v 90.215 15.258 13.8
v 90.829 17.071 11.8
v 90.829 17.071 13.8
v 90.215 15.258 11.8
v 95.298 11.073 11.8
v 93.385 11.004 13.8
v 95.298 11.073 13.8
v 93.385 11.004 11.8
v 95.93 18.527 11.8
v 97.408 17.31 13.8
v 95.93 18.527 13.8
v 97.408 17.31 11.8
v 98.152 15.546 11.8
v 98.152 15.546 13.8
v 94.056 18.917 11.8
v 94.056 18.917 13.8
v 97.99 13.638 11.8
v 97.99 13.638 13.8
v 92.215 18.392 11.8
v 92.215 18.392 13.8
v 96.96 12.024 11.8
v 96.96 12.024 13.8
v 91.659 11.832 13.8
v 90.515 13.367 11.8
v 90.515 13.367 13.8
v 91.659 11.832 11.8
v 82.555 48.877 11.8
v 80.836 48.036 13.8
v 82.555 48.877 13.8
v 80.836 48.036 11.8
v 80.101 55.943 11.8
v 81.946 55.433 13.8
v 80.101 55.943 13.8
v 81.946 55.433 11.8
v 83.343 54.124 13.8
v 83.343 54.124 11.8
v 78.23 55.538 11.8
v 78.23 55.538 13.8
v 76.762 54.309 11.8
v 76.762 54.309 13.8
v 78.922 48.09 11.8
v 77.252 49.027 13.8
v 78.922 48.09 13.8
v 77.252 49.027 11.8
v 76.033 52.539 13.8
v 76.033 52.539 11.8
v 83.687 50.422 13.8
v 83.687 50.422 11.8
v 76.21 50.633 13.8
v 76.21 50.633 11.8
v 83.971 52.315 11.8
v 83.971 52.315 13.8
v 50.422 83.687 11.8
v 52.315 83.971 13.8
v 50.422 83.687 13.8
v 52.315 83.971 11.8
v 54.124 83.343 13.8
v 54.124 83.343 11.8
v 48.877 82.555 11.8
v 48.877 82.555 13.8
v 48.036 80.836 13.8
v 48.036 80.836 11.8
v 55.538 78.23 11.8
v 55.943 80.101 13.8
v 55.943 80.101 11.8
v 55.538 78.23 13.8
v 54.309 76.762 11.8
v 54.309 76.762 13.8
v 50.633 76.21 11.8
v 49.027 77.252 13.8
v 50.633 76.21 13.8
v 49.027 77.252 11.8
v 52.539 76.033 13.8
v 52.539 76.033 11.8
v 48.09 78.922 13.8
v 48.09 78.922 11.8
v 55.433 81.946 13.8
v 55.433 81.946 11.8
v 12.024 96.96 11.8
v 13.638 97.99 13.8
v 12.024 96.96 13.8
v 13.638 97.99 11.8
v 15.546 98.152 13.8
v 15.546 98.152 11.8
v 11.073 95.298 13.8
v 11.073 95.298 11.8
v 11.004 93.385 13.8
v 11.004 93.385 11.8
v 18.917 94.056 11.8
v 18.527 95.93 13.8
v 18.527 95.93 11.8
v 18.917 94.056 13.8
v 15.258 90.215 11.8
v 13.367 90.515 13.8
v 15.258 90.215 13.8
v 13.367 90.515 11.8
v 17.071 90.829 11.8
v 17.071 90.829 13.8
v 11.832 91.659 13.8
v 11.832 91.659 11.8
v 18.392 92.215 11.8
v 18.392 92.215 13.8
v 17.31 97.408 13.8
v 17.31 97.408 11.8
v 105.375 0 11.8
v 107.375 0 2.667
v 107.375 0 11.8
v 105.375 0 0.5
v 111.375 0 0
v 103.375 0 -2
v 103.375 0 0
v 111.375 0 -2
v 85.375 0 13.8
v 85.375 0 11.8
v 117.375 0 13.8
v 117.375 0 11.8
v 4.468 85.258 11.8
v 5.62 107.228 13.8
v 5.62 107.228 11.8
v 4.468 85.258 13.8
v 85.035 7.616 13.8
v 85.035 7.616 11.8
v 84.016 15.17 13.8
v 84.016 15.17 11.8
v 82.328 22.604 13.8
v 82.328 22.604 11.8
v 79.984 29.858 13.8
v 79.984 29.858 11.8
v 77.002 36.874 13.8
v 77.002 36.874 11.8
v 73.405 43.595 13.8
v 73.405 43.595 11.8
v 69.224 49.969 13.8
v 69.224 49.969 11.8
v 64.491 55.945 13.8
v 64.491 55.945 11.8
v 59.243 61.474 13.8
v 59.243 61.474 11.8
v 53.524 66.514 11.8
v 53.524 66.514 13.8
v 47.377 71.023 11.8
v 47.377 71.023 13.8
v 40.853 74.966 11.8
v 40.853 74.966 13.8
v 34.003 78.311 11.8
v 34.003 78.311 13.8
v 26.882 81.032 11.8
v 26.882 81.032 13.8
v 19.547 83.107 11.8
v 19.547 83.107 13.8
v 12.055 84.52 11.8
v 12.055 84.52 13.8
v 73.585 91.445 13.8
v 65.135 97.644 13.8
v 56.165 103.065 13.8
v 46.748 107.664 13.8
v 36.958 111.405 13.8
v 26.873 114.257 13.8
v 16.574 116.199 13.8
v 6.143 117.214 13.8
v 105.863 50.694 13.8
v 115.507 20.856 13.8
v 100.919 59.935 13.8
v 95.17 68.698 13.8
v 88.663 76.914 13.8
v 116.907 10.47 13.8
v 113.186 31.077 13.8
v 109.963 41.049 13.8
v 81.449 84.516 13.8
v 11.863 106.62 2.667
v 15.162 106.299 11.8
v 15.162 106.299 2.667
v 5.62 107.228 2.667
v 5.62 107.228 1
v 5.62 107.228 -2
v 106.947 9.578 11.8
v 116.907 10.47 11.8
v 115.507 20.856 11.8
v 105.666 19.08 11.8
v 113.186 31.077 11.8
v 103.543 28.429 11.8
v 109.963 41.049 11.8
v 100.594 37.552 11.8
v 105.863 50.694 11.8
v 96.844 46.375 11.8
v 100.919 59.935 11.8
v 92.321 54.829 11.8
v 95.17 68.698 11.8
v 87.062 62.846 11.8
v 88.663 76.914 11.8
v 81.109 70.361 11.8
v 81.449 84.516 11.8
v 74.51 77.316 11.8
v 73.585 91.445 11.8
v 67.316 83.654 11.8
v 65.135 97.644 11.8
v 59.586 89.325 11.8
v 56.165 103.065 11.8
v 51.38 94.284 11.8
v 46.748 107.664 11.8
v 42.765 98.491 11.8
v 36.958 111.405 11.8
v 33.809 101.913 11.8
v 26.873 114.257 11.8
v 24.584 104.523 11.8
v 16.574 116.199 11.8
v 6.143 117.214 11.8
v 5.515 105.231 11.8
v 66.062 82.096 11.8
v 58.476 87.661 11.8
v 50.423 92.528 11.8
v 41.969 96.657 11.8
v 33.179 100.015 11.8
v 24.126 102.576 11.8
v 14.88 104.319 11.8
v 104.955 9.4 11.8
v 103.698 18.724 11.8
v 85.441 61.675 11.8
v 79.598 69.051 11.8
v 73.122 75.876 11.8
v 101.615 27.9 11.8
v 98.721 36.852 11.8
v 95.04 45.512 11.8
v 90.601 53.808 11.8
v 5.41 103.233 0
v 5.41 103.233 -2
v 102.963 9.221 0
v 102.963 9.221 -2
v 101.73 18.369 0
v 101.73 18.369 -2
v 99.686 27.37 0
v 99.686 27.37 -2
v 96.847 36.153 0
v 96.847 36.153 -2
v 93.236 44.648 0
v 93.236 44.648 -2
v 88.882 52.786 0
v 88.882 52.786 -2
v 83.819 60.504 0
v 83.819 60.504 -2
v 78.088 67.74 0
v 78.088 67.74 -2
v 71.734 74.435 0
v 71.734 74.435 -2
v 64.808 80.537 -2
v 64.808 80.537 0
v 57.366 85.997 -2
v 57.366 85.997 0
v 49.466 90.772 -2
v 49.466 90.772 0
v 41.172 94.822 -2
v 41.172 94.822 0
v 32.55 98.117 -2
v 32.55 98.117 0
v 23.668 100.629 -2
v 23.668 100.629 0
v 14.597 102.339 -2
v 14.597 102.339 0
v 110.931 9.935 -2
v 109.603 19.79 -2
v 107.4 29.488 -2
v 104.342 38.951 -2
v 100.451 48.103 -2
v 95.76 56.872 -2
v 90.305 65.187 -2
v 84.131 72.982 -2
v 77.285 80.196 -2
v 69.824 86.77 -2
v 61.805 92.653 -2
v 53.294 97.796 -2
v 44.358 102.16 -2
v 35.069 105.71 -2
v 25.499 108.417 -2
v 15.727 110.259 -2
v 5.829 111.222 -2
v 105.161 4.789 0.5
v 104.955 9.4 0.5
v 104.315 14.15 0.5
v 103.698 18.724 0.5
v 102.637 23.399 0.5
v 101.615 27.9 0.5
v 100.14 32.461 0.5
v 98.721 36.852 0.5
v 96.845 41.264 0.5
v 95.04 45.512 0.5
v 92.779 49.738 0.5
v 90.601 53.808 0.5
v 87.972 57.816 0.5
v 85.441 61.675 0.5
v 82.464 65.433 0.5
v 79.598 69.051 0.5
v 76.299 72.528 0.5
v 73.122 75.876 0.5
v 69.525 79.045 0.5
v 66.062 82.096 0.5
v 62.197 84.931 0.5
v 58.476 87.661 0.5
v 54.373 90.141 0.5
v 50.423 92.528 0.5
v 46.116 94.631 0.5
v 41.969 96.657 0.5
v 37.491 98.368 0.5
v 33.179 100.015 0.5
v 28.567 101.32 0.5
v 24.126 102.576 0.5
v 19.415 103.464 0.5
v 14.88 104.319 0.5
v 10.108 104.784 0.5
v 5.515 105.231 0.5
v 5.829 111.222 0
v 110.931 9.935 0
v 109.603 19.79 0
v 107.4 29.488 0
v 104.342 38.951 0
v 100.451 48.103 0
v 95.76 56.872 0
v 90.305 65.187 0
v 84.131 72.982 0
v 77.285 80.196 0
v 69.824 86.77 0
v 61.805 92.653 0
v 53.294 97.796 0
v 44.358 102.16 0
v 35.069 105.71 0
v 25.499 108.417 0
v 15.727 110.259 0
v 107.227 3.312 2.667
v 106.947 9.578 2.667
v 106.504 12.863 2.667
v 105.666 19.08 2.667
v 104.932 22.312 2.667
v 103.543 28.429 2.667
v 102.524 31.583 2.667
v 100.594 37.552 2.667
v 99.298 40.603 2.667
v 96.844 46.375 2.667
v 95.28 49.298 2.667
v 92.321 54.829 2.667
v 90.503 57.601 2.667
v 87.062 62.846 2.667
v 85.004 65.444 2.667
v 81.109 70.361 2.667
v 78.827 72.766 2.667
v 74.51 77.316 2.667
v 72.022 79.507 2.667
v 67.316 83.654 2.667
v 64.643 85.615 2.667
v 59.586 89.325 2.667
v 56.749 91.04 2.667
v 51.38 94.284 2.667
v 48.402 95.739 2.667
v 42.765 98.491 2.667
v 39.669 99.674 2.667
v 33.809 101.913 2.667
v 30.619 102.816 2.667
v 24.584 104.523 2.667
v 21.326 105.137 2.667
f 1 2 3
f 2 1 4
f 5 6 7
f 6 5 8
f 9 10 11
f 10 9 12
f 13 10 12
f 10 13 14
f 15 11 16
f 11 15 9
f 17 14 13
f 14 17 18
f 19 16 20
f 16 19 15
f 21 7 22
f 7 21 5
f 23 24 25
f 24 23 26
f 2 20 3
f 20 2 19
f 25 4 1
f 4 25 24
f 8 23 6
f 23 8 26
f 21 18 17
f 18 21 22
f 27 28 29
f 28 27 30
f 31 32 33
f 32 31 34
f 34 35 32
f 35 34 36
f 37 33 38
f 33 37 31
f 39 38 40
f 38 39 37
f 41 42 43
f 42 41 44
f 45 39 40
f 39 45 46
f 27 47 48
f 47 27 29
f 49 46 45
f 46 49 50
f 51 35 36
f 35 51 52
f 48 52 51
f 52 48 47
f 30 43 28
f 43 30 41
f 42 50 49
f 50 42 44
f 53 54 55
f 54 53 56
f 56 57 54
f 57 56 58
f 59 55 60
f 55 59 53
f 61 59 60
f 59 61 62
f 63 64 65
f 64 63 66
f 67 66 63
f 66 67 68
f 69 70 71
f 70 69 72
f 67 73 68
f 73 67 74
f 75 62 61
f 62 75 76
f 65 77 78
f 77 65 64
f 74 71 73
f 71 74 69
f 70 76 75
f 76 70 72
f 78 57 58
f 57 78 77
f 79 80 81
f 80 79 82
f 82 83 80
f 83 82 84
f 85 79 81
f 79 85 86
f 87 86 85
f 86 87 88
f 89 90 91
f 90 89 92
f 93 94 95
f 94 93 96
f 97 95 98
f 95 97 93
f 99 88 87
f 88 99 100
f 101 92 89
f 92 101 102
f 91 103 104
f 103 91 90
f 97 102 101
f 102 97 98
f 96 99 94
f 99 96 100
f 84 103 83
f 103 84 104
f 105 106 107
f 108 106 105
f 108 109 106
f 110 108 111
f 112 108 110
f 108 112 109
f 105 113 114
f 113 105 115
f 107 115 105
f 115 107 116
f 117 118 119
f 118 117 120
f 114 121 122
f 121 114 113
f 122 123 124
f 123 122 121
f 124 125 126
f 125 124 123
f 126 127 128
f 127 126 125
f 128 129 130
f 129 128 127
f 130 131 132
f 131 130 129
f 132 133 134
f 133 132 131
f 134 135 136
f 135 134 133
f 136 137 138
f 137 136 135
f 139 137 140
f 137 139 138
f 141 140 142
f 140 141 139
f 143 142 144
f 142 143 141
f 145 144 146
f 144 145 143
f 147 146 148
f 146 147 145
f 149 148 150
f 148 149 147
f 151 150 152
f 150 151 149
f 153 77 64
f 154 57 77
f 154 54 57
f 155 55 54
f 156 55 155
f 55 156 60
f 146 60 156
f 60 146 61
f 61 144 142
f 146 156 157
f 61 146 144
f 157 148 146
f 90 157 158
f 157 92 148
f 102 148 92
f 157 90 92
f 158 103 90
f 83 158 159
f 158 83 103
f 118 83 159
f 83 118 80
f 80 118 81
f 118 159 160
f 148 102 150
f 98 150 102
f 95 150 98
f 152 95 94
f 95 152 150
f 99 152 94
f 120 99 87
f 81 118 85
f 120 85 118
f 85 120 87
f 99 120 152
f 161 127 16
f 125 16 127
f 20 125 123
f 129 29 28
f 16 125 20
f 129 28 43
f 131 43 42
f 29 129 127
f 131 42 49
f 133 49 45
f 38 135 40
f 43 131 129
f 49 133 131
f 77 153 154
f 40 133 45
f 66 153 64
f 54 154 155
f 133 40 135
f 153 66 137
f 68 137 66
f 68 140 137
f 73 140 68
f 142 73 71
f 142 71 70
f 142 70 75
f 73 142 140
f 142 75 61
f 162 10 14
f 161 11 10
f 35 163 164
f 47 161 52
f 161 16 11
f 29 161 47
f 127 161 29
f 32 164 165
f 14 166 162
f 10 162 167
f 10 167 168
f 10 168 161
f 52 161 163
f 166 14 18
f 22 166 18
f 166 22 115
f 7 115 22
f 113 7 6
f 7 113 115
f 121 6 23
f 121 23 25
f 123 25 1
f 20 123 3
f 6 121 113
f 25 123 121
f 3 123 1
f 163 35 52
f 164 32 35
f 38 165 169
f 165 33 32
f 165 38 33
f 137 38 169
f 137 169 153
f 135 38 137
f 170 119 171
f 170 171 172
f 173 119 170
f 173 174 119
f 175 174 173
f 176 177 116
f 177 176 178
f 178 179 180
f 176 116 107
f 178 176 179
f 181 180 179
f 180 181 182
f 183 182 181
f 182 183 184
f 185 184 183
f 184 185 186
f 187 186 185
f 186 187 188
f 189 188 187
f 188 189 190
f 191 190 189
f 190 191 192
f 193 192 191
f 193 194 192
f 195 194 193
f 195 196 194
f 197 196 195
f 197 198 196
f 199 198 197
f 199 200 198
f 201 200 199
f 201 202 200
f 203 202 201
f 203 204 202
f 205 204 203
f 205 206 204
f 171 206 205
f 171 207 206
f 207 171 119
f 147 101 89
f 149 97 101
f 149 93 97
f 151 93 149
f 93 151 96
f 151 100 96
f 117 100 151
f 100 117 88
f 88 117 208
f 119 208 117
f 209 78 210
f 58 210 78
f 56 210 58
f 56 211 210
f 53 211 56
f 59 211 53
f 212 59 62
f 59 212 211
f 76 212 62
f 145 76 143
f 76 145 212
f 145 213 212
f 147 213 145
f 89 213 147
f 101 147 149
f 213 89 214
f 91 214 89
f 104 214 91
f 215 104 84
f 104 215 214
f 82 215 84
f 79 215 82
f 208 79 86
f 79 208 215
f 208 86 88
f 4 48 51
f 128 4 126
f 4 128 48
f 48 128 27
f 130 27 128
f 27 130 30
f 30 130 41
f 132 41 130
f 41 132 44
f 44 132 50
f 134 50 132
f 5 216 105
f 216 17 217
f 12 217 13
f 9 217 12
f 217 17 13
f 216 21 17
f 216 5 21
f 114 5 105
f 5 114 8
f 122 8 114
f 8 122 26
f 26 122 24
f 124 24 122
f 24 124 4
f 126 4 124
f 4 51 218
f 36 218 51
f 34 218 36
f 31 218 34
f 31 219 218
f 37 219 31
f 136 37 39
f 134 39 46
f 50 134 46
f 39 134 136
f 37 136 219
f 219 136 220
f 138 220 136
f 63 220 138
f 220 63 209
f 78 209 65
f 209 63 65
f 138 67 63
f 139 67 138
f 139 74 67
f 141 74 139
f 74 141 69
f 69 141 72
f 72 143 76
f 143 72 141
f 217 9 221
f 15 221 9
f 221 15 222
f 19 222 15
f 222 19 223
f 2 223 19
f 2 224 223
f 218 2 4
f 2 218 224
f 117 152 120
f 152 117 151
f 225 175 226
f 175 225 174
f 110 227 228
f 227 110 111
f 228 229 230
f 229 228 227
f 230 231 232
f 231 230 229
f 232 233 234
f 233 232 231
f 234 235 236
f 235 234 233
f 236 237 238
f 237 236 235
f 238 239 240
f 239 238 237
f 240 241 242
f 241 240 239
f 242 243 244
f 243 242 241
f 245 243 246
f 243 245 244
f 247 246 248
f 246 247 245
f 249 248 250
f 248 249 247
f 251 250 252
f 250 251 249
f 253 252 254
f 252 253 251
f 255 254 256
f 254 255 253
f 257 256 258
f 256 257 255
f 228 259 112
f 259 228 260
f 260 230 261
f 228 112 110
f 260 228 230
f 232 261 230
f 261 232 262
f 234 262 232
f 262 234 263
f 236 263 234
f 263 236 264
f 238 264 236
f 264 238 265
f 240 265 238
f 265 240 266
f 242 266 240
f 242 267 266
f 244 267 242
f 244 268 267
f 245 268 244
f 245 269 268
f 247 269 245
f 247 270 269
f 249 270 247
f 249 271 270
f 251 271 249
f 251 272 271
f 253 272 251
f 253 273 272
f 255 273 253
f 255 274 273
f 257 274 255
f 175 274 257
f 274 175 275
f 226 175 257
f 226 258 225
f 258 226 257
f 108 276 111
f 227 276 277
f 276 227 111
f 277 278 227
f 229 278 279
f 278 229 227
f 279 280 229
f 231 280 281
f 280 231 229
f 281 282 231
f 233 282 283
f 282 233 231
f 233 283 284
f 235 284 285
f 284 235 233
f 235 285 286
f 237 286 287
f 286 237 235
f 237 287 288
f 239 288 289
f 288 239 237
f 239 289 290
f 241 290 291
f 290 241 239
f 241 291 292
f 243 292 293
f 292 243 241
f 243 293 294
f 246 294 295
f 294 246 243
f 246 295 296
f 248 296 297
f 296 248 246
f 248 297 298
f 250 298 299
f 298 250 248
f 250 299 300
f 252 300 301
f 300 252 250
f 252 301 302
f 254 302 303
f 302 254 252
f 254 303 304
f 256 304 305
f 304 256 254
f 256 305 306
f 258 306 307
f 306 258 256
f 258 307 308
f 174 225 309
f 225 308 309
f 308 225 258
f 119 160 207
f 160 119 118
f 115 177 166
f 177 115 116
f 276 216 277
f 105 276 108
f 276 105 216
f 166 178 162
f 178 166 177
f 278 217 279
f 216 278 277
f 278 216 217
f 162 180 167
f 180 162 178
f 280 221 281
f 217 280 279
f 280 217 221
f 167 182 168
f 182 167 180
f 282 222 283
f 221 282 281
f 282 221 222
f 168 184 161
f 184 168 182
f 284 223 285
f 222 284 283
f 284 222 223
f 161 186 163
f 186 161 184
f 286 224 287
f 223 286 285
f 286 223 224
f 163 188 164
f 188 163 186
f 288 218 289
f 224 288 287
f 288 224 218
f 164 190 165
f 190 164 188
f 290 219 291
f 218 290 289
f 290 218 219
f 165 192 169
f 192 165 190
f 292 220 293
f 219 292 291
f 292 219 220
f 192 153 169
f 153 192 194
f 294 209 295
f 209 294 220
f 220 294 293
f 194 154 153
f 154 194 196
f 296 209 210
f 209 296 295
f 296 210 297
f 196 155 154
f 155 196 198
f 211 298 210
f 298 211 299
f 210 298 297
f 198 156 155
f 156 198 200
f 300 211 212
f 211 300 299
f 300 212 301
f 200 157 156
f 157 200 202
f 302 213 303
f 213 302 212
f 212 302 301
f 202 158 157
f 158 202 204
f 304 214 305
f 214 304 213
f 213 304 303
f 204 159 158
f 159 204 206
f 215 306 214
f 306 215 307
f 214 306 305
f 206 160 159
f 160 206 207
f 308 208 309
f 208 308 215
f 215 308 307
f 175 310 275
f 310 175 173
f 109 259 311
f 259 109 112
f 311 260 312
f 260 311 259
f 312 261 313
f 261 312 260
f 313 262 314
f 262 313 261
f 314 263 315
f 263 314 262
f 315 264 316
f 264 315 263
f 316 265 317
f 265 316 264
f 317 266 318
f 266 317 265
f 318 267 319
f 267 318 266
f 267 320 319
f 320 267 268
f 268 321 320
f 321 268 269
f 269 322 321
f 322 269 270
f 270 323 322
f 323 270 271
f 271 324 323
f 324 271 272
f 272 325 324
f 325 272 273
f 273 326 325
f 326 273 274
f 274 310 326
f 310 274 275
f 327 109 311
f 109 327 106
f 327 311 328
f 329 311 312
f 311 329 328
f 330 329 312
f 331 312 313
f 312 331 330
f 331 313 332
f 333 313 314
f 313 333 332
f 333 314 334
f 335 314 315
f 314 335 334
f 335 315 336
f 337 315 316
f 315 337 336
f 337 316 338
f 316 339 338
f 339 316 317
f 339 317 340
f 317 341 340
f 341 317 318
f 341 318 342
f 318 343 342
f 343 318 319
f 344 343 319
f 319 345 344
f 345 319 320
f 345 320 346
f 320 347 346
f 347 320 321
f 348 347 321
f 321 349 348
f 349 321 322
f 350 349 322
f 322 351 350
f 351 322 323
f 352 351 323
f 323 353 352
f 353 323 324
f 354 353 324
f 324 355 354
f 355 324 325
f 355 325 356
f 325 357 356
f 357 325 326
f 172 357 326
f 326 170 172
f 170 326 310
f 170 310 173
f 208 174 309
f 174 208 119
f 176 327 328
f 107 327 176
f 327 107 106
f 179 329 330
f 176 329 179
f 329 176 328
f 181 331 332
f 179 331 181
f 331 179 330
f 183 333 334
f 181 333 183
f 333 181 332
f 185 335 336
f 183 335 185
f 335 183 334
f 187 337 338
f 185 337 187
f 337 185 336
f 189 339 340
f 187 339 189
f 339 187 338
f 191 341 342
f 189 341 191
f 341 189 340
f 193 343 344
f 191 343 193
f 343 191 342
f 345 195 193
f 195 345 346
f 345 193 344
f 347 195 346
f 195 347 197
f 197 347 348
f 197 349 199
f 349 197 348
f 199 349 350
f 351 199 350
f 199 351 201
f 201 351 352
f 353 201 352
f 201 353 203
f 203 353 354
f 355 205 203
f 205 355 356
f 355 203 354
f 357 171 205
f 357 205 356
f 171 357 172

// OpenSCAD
ANTENA_DIAMETER = 210.75;
ANTENNA_RIM_THICKNESS = 11.8;

CLAMP_RIDGE_THICKNESS = 2;
CLAMP_RIDGE_DIAMETER = ANTENA_DIAMETER;
CLAMP_RAIL_INNER_TOP = 20;
CLAMP_RAIL_INNER_BOTTOM = 2;
CLAMP_RAIL_OUTER_TOP = 10;
CLAMP_RAIL_THICKNESS = 2;
CLAMP_RAIL_OUTER_BOTTOM = 4;
CLAMP_RAIL_OUTER_BOTTOM_SUPPORT_HEIGHT = 4;

module cylinder_slice(radius, height, thickness, angle)
{
    rotate_extrude(angle=angle)
        translate([radius, 0]) 
            square([thickness, height]); 
}

module cylinder_ramp_slice(radius, height, thickness, angle, reverse=false)
{
    rotate_extrude(angle = angle)
        polygon(
            reverse ?
            // reversed slope: inner = height, outer = 0
            [
                [radius,            0],       // inner low
                [radius+thickness,  height],  // outer high
                [radius+thickness,  0]        // outer low
            ]
            :
            // normal slope: inner = 0, outer = height
            [
                [radius,            0],
                [radius,            height],
                [radius+thickness,  0]
            ]
        );
}


module radial_cylinders(
    count,          // number of cylinders
    circle_r,       // radius of the circle on which cylinders sit
    cyl_r,          // cylinder radius
    cyl_h,          // cylinder height
    phase = 0       // rotation offset in degrees
){
    for(i = [0 : count-1]) {
        angle = phase + 360/count * i;

        // Position cylinder on circle
        translate([circle_r*cos(angle), circle_r*sin(angle), 0])
            // Rotate cylinder so its axis is perpendicular to the circle plane
            rotate([0, 0, angle])
                cylinder(h = cyl_h, r = cyl_r, center = true);
    }
}



//cylinder(ANTENNA_RIM_THICKNESS, ANTENA_DIAMETER/2, ANTENA_DIAMETER/2, $fa=5);

// rotate_extrude(angle = 60, $fa=5)   // slice angle in degrees
//     translate([CLAMP_RIDGE_DIAMETER/2, 0])       // radius = 10
//         square([CLAMP_RIDGE_THICKNESS, ANTENNA_RIM_THICKNESS]);      // thickness = 2
union()
{
    cylinder_slice(CLAMP_RIDGE_DIAMETER/2, ANTENNA_RIM_THICKNESS, CLAMP_RIDGE_THICKNESS, 87, $fa=5);

    color("red")
    union()
    {
        difference()
        {
            translate([0,0,ANTENNA_RIM_THICKNESS])
            cylinder_slice(CLAMP_RIDGE_DIAMETER/2-CLAMP_RAIL_INNER_TOP, CLAMP_RAIL_THICKNESS, CLAMP_RAIL_INNER_TOP+CLAMP_RIDGE_THICKNESS, 87, $fa=5);

            translate([0,0,7+ANTENNA_RIM_THICKNESS/2])
            radial_cylinders(15, CLAMP_RIDGE_DIAMETER/2-CLAMP_RAIL_INNER_TOP/2, 4, 15, 9);
        }


        translate([0,0,-CLAMP_RAIL_THICKNESS])
        cylinder_slice(CLAMP_RIDGE_DIAMETER/2-CLAMP_RAIL_INNER_BOTTOM, CLAMP_RAIL_THICKNESS, CLAMP_RAIL_INNER_BOTTOM+CLAMP_RIDGE_THICKNESS, 87, $fa=5);
        translate([0,0,0])
        cylinder_ramp_slice(CLAMP_RIDGE_DIAMETER/2-CLAMP_RAIL_INNER_BOTTOM, CLAMP_RAIL_INNER_BOTTOM/2, CLAMP_RAIL_INNER_BOTTOM+CLAMP_RIDGE_THICKNESS, 87, reverse=true, $fa=5);
    }

    color("green")
    union()
    {
        translate([0,0,ANTENNA_RIM_THICKNESS])
        cylinder_slice(CLAMP_RIDGE_DIAMETER/2, CLAMP_RAIL_THICKNESS, CLAMP_RAIL_OUTER_TOP+CLAMP_RIDGE_THICKNESS, 87, $fa=5);

        translate([0,0,-CLAMP_RAIL_THICKNESS])
        cylinder_slice(CLAMP_RIDGE_DIAMETER/2, CLAMP_RAIL_THICKNESS, CLAMP_RAIL_OUTER_BOTTOM+CLAMP_RIDGE_THICKNESS, 87, $fa=5);

        translate([0,0,0])
        cylinder_ramp_slice(CLAMP_RIDGE_DIAMETER/2, CLAMP_RAIL_OUTER_BOTTOM_SUPPORT_HEIGHT, CLAMP_RAIL_OUTER_BOTTOM+CLAMP_RIDGE_THICKNESS, 87, $fa=5);
    }

}
